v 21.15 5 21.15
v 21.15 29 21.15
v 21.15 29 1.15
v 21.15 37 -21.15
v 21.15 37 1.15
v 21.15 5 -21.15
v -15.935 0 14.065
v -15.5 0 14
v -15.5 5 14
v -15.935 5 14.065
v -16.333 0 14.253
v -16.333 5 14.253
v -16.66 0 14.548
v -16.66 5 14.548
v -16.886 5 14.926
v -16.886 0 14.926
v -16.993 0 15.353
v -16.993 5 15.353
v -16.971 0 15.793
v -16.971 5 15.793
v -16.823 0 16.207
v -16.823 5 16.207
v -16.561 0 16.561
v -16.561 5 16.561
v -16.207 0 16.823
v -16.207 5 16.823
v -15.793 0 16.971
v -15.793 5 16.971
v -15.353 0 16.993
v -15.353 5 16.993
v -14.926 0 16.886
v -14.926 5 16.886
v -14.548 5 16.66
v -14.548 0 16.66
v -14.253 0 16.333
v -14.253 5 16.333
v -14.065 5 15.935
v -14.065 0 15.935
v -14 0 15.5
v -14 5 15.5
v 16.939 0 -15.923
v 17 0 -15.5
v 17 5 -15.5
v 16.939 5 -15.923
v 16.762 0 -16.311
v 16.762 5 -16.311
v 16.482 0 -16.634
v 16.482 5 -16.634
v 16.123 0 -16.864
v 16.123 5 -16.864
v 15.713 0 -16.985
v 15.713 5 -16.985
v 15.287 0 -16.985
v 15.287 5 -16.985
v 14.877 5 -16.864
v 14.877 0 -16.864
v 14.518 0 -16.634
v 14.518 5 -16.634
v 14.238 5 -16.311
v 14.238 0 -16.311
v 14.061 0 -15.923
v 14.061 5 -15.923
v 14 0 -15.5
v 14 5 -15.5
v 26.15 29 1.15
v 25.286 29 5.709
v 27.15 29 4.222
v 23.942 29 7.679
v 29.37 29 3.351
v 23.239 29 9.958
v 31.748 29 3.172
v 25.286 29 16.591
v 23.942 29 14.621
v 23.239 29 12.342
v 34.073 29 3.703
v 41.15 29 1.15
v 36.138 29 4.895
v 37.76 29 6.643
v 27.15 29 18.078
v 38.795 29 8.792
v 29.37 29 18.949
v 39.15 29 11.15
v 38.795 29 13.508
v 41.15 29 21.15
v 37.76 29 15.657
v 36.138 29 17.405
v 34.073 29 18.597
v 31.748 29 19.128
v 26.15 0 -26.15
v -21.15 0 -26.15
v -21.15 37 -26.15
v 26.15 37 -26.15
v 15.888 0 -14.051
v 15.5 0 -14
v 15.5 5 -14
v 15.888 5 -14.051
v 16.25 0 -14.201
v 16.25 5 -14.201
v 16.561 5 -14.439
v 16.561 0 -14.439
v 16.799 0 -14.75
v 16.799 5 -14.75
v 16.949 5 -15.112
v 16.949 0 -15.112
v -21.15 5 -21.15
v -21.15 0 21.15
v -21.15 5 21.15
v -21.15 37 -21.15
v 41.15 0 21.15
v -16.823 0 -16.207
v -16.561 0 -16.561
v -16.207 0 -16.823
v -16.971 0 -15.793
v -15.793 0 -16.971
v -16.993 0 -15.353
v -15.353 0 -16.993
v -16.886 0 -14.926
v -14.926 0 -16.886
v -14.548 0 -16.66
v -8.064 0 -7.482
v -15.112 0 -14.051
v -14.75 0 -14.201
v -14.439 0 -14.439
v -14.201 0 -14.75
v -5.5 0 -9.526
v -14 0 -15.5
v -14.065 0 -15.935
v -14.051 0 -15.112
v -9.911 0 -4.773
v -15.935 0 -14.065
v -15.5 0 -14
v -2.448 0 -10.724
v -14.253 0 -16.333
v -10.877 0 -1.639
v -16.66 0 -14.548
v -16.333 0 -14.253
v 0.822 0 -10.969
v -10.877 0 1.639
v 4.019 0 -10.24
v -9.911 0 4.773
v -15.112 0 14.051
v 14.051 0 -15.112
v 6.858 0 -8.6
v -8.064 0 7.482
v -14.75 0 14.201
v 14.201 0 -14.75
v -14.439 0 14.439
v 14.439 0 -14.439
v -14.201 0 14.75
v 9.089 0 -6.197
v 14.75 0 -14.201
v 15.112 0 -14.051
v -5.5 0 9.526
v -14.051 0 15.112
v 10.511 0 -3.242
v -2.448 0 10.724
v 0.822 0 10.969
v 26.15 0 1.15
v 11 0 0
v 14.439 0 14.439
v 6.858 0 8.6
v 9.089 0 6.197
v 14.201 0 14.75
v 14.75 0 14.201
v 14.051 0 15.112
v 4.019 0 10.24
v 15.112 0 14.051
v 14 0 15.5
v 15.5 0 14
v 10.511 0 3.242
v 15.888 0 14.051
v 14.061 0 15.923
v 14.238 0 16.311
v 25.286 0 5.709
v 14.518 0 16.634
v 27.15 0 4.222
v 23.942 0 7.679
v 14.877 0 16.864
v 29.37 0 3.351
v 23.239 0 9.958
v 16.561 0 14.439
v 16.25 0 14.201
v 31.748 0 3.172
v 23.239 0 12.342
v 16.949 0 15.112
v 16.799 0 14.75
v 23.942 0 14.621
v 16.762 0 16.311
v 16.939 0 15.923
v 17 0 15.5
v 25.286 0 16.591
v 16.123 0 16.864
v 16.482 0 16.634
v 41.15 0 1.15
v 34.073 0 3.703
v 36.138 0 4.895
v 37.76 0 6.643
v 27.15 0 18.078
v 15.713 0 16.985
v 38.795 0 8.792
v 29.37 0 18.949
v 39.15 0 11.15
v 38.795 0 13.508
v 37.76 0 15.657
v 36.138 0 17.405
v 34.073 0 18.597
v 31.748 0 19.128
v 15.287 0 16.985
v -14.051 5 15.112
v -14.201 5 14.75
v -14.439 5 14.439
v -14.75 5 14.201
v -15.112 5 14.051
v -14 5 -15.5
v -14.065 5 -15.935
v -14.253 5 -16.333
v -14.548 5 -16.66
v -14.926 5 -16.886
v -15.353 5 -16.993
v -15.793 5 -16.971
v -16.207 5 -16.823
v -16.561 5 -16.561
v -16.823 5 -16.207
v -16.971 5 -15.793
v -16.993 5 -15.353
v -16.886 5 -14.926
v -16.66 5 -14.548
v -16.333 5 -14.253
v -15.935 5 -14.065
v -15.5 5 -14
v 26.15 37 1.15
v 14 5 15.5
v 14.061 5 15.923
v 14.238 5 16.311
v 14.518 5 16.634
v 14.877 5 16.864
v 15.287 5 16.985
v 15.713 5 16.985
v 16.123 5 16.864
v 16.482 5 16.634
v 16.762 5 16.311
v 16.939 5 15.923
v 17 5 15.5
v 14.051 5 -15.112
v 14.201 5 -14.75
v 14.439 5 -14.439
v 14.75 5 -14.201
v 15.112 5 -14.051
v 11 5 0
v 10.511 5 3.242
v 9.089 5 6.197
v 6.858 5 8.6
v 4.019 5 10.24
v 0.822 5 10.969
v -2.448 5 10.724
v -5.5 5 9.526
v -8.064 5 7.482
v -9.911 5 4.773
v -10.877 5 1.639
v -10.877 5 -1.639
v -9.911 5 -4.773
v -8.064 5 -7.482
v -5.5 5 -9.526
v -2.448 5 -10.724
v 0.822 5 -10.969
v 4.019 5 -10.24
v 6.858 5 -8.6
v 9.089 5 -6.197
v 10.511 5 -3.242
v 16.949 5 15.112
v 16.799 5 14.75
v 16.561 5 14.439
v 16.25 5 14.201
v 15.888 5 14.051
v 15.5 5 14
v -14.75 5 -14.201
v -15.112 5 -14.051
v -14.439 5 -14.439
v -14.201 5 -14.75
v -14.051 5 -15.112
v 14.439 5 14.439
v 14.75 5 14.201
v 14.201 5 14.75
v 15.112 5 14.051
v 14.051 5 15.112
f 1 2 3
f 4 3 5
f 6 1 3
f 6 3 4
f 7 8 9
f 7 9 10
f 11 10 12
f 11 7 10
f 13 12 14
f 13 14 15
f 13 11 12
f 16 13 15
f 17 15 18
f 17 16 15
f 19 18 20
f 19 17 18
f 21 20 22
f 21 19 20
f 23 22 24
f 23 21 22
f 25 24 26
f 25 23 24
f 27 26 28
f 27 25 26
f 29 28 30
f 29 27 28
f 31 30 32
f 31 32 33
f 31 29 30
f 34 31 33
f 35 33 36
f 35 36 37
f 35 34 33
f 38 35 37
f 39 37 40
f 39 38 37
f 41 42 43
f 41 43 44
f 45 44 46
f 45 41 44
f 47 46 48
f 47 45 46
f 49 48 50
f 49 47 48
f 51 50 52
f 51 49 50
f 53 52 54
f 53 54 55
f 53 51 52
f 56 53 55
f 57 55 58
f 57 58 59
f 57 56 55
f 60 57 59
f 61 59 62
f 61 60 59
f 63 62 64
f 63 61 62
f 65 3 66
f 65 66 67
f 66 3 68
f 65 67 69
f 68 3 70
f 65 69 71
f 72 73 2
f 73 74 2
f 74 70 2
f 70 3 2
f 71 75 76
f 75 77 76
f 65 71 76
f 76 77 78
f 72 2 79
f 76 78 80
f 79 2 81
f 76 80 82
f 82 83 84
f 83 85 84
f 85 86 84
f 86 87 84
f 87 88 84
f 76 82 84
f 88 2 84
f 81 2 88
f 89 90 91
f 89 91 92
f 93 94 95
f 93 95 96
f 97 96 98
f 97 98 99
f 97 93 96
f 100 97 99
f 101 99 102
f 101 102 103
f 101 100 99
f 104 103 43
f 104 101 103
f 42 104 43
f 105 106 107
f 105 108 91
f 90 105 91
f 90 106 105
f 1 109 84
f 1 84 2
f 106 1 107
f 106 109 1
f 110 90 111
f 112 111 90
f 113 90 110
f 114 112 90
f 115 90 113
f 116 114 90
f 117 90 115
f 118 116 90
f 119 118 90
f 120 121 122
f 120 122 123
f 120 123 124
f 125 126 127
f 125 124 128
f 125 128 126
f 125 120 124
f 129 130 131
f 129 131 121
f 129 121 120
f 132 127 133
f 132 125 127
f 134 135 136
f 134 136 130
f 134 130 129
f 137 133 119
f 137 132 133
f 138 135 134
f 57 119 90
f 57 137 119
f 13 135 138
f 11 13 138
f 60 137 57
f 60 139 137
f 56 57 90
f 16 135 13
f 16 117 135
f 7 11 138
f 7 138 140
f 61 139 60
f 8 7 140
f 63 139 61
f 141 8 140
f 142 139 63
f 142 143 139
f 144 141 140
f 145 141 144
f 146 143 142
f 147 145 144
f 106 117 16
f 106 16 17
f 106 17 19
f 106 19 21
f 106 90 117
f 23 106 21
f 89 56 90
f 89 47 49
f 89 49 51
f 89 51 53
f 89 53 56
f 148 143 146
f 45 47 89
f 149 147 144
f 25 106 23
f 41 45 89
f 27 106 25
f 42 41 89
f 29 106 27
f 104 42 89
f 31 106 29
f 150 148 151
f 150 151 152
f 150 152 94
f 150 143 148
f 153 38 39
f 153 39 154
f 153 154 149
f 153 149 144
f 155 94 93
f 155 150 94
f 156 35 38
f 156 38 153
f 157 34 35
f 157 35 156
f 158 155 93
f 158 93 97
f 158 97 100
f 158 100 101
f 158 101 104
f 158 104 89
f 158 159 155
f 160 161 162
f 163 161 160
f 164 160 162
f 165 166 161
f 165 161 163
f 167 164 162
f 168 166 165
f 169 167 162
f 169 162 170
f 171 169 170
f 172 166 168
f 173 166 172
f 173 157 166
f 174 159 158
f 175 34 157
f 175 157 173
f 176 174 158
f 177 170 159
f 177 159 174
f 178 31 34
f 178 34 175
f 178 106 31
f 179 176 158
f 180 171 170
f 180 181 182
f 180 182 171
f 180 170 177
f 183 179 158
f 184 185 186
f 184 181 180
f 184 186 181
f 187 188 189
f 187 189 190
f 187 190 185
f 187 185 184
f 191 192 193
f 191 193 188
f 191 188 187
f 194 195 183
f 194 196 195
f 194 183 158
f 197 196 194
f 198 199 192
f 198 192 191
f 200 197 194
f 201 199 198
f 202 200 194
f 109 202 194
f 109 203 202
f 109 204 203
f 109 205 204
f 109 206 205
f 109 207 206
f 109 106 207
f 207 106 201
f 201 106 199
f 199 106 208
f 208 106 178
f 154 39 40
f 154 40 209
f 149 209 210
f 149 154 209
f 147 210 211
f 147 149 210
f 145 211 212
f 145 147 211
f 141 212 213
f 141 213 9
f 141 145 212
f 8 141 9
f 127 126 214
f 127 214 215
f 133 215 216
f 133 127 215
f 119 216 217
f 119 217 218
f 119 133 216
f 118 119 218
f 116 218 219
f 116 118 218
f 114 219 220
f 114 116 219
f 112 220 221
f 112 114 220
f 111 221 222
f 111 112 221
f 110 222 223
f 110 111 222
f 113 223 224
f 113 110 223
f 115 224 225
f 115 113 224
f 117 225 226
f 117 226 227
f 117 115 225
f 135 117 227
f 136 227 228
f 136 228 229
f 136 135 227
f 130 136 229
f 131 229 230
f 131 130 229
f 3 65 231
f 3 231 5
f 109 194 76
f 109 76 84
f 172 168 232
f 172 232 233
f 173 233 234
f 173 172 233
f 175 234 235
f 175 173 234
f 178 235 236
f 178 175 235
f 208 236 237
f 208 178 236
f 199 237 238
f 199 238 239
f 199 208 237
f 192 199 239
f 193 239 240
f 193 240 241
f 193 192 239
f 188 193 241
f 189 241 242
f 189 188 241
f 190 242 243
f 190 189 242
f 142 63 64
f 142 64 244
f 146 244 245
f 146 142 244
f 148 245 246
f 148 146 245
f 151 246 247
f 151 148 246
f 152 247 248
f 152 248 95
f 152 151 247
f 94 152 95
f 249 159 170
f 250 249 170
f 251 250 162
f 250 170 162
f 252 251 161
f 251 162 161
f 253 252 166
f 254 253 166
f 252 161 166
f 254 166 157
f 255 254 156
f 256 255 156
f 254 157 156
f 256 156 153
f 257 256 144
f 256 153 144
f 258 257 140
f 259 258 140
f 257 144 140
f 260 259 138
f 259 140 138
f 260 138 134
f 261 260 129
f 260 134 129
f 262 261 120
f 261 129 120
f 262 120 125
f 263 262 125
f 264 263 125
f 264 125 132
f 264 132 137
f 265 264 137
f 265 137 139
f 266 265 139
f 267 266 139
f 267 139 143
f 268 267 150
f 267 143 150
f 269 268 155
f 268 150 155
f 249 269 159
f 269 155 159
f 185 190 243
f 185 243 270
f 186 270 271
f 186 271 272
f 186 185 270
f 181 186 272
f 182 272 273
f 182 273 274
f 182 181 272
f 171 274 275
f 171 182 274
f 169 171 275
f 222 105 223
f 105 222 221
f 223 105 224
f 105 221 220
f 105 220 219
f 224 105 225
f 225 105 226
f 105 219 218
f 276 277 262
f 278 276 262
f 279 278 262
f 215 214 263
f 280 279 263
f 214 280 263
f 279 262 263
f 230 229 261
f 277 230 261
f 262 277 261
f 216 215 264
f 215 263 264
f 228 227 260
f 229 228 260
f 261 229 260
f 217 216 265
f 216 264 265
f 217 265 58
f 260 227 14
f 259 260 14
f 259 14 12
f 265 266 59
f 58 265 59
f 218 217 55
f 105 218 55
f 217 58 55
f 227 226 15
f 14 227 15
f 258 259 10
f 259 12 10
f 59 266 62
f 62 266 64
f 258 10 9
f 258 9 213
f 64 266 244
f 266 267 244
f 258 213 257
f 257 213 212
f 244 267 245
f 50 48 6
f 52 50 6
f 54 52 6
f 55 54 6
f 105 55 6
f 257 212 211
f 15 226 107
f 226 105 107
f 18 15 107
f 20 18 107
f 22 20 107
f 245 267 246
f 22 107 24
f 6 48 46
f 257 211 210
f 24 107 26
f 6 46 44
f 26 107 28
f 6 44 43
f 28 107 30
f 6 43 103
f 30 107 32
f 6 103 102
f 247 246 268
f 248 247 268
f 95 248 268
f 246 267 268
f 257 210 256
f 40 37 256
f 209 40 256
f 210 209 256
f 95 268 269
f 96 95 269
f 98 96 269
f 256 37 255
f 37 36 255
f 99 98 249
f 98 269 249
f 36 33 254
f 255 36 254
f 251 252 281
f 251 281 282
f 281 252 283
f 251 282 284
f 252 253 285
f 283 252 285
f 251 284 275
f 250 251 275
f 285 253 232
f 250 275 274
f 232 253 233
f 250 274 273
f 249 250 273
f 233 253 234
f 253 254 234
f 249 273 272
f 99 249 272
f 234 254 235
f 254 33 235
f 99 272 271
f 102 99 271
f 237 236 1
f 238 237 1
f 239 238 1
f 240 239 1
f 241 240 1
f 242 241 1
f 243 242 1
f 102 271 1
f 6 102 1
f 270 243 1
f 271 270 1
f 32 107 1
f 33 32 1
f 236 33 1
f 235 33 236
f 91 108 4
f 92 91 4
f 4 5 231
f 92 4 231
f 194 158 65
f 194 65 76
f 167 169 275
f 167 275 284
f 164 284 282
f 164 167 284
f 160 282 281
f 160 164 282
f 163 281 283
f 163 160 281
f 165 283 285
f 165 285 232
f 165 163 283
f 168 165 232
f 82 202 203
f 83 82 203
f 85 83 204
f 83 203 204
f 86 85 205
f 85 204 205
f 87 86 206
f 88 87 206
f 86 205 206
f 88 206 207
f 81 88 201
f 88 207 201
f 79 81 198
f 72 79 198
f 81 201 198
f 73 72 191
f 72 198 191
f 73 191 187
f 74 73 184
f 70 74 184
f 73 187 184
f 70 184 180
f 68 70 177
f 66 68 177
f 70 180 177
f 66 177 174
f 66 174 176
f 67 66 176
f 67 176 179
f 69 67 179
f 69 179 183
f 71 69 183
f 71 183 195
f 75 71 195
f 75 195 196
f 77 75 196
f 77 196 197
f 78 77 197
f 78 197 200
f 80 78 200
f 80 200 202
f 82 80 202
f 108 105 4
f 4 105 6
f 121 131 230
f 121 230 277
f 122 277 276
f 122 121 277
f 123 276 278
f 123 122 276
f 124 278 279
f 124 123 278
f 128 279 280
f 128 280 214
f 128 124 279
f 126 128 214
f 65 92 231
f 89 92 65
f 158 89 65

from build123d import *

# Parameters (mm, degrees)
F0_W     = 42.3
F0_H     = 5
F0_R     = 8
F0_R_2   = 11
F1_DEPTH = 5
F2_DEPTH = 37
F3_DEPTH = 29


with BuildPart() as f1:
    # F0 (on Front) → F1 (new body)
    with BuildSketch(Plane.XZ):
        with Locations((0, -23.65)):
            Rectangle(F0_W, F0_H)
        Polygon((21.15, 20.15), (21.15, 1.15), (26.15, 1.15), (41.15, 1.15), (41.15, 21.15), (26.15, 21.15), (21.15, 21.15), align=None)
        with Locations((31.15, 11.15)):
            Circle(F0_R, mode=Mode.SUBTRACT)
        Polygon((21.15, 1.15), (21.15, -21.15), (21.15, -26.15), (26.15, -26.15), (26.15, 1.15), align=None)
        Polygon((-21.15, -21.15), (21.15, -21.15), (21.15, 1.15), (21.15, 20.15), (21.15, 21.15), (20.15, 21.15), (-21.15, 21.15), align=None)
        with BuildLine():
            Line((14, -15.5), (-14, -15.5))
            ThreePointArc((-14, -15.5), (-16.56066, -16.56066), (-15.5, -14))
            Line((-15.5, -14), (-15.5, 14))
            ThreePointArc((-15.5, 14), (-16.56066, 16.56066), (-14, 15.5))
            Line((-14, 15.5), (14, 15.5))
            ThreePointArc((14, 15.5), (15.5, 17), (17, 15.5))
            ThreePointArc((17, 15.5), (16.56066, 14.43934), (15.5, 14))
            Line((15.5, 14), (15.5, -14))
            ThreePointArc((15.5, -14), (16.56066, -14.43934), (17, -15.5))
            ThreePointArc((17, -15.5), (15.5, -17), (14, -15.5))
        make_face(mode=Mode.SUBTRACT)
        with BuildLine():
            ThreePointArc((-15.5, -14), (-14.43934, -14.43934), (-14, -15.5))
            Line((-14, -15.5), (14, -15.5))
            ThreePointArc((14, -15.5), (14.43934, -14.43934), (15.5, -14))
            Line((15.5, -14), (15.5, 14))
            ThreePointArc((15.5, 14), (14.43934, 14.43934), (14, 15.5))
            Line((14, 15.5), (-14, 15.5))
            ThreePointArc((-14, 15.5), (-14.43934, 14.43934), (-15.5, 14))
            Line((-15.5, 14), (-15.5, -14))
        make_face()
        Circle(F0_R_2, mode=Mode.SUBTRACT)
    extrude(amount=-F1_DEPTH)

    # F0 (on Front) → F2 (join)
    with BuildSketch(Plane.XZ):
        with Locations((0, -23.65)):
            Rectangle(F0_W, F0_H)
        Polygon((21.15, 1.15), (21.15, -21.15), (21.15, -26.15), (26.15, -26.15), (26.15, 1.15), align=None)
    extrude(amount=-F2_DEPTH)

    # F0 (on Front) → F3 (join)
    with BuildSketch(Plane.XZ):
        Polygon((21.15, 20.15), (21.15, 1.15), (26.15, 1.15), (41.15, 1.15), (41.15, 21.15), (26.15, 21.15), (21.15, 21.15), align=None)
        with Locations((31.15, 11.15)):
            Circle(F0_R, mode=Mode.SUBTRACT)
    extrude(amount=-F3_DEPTH)


solid = f1.part
